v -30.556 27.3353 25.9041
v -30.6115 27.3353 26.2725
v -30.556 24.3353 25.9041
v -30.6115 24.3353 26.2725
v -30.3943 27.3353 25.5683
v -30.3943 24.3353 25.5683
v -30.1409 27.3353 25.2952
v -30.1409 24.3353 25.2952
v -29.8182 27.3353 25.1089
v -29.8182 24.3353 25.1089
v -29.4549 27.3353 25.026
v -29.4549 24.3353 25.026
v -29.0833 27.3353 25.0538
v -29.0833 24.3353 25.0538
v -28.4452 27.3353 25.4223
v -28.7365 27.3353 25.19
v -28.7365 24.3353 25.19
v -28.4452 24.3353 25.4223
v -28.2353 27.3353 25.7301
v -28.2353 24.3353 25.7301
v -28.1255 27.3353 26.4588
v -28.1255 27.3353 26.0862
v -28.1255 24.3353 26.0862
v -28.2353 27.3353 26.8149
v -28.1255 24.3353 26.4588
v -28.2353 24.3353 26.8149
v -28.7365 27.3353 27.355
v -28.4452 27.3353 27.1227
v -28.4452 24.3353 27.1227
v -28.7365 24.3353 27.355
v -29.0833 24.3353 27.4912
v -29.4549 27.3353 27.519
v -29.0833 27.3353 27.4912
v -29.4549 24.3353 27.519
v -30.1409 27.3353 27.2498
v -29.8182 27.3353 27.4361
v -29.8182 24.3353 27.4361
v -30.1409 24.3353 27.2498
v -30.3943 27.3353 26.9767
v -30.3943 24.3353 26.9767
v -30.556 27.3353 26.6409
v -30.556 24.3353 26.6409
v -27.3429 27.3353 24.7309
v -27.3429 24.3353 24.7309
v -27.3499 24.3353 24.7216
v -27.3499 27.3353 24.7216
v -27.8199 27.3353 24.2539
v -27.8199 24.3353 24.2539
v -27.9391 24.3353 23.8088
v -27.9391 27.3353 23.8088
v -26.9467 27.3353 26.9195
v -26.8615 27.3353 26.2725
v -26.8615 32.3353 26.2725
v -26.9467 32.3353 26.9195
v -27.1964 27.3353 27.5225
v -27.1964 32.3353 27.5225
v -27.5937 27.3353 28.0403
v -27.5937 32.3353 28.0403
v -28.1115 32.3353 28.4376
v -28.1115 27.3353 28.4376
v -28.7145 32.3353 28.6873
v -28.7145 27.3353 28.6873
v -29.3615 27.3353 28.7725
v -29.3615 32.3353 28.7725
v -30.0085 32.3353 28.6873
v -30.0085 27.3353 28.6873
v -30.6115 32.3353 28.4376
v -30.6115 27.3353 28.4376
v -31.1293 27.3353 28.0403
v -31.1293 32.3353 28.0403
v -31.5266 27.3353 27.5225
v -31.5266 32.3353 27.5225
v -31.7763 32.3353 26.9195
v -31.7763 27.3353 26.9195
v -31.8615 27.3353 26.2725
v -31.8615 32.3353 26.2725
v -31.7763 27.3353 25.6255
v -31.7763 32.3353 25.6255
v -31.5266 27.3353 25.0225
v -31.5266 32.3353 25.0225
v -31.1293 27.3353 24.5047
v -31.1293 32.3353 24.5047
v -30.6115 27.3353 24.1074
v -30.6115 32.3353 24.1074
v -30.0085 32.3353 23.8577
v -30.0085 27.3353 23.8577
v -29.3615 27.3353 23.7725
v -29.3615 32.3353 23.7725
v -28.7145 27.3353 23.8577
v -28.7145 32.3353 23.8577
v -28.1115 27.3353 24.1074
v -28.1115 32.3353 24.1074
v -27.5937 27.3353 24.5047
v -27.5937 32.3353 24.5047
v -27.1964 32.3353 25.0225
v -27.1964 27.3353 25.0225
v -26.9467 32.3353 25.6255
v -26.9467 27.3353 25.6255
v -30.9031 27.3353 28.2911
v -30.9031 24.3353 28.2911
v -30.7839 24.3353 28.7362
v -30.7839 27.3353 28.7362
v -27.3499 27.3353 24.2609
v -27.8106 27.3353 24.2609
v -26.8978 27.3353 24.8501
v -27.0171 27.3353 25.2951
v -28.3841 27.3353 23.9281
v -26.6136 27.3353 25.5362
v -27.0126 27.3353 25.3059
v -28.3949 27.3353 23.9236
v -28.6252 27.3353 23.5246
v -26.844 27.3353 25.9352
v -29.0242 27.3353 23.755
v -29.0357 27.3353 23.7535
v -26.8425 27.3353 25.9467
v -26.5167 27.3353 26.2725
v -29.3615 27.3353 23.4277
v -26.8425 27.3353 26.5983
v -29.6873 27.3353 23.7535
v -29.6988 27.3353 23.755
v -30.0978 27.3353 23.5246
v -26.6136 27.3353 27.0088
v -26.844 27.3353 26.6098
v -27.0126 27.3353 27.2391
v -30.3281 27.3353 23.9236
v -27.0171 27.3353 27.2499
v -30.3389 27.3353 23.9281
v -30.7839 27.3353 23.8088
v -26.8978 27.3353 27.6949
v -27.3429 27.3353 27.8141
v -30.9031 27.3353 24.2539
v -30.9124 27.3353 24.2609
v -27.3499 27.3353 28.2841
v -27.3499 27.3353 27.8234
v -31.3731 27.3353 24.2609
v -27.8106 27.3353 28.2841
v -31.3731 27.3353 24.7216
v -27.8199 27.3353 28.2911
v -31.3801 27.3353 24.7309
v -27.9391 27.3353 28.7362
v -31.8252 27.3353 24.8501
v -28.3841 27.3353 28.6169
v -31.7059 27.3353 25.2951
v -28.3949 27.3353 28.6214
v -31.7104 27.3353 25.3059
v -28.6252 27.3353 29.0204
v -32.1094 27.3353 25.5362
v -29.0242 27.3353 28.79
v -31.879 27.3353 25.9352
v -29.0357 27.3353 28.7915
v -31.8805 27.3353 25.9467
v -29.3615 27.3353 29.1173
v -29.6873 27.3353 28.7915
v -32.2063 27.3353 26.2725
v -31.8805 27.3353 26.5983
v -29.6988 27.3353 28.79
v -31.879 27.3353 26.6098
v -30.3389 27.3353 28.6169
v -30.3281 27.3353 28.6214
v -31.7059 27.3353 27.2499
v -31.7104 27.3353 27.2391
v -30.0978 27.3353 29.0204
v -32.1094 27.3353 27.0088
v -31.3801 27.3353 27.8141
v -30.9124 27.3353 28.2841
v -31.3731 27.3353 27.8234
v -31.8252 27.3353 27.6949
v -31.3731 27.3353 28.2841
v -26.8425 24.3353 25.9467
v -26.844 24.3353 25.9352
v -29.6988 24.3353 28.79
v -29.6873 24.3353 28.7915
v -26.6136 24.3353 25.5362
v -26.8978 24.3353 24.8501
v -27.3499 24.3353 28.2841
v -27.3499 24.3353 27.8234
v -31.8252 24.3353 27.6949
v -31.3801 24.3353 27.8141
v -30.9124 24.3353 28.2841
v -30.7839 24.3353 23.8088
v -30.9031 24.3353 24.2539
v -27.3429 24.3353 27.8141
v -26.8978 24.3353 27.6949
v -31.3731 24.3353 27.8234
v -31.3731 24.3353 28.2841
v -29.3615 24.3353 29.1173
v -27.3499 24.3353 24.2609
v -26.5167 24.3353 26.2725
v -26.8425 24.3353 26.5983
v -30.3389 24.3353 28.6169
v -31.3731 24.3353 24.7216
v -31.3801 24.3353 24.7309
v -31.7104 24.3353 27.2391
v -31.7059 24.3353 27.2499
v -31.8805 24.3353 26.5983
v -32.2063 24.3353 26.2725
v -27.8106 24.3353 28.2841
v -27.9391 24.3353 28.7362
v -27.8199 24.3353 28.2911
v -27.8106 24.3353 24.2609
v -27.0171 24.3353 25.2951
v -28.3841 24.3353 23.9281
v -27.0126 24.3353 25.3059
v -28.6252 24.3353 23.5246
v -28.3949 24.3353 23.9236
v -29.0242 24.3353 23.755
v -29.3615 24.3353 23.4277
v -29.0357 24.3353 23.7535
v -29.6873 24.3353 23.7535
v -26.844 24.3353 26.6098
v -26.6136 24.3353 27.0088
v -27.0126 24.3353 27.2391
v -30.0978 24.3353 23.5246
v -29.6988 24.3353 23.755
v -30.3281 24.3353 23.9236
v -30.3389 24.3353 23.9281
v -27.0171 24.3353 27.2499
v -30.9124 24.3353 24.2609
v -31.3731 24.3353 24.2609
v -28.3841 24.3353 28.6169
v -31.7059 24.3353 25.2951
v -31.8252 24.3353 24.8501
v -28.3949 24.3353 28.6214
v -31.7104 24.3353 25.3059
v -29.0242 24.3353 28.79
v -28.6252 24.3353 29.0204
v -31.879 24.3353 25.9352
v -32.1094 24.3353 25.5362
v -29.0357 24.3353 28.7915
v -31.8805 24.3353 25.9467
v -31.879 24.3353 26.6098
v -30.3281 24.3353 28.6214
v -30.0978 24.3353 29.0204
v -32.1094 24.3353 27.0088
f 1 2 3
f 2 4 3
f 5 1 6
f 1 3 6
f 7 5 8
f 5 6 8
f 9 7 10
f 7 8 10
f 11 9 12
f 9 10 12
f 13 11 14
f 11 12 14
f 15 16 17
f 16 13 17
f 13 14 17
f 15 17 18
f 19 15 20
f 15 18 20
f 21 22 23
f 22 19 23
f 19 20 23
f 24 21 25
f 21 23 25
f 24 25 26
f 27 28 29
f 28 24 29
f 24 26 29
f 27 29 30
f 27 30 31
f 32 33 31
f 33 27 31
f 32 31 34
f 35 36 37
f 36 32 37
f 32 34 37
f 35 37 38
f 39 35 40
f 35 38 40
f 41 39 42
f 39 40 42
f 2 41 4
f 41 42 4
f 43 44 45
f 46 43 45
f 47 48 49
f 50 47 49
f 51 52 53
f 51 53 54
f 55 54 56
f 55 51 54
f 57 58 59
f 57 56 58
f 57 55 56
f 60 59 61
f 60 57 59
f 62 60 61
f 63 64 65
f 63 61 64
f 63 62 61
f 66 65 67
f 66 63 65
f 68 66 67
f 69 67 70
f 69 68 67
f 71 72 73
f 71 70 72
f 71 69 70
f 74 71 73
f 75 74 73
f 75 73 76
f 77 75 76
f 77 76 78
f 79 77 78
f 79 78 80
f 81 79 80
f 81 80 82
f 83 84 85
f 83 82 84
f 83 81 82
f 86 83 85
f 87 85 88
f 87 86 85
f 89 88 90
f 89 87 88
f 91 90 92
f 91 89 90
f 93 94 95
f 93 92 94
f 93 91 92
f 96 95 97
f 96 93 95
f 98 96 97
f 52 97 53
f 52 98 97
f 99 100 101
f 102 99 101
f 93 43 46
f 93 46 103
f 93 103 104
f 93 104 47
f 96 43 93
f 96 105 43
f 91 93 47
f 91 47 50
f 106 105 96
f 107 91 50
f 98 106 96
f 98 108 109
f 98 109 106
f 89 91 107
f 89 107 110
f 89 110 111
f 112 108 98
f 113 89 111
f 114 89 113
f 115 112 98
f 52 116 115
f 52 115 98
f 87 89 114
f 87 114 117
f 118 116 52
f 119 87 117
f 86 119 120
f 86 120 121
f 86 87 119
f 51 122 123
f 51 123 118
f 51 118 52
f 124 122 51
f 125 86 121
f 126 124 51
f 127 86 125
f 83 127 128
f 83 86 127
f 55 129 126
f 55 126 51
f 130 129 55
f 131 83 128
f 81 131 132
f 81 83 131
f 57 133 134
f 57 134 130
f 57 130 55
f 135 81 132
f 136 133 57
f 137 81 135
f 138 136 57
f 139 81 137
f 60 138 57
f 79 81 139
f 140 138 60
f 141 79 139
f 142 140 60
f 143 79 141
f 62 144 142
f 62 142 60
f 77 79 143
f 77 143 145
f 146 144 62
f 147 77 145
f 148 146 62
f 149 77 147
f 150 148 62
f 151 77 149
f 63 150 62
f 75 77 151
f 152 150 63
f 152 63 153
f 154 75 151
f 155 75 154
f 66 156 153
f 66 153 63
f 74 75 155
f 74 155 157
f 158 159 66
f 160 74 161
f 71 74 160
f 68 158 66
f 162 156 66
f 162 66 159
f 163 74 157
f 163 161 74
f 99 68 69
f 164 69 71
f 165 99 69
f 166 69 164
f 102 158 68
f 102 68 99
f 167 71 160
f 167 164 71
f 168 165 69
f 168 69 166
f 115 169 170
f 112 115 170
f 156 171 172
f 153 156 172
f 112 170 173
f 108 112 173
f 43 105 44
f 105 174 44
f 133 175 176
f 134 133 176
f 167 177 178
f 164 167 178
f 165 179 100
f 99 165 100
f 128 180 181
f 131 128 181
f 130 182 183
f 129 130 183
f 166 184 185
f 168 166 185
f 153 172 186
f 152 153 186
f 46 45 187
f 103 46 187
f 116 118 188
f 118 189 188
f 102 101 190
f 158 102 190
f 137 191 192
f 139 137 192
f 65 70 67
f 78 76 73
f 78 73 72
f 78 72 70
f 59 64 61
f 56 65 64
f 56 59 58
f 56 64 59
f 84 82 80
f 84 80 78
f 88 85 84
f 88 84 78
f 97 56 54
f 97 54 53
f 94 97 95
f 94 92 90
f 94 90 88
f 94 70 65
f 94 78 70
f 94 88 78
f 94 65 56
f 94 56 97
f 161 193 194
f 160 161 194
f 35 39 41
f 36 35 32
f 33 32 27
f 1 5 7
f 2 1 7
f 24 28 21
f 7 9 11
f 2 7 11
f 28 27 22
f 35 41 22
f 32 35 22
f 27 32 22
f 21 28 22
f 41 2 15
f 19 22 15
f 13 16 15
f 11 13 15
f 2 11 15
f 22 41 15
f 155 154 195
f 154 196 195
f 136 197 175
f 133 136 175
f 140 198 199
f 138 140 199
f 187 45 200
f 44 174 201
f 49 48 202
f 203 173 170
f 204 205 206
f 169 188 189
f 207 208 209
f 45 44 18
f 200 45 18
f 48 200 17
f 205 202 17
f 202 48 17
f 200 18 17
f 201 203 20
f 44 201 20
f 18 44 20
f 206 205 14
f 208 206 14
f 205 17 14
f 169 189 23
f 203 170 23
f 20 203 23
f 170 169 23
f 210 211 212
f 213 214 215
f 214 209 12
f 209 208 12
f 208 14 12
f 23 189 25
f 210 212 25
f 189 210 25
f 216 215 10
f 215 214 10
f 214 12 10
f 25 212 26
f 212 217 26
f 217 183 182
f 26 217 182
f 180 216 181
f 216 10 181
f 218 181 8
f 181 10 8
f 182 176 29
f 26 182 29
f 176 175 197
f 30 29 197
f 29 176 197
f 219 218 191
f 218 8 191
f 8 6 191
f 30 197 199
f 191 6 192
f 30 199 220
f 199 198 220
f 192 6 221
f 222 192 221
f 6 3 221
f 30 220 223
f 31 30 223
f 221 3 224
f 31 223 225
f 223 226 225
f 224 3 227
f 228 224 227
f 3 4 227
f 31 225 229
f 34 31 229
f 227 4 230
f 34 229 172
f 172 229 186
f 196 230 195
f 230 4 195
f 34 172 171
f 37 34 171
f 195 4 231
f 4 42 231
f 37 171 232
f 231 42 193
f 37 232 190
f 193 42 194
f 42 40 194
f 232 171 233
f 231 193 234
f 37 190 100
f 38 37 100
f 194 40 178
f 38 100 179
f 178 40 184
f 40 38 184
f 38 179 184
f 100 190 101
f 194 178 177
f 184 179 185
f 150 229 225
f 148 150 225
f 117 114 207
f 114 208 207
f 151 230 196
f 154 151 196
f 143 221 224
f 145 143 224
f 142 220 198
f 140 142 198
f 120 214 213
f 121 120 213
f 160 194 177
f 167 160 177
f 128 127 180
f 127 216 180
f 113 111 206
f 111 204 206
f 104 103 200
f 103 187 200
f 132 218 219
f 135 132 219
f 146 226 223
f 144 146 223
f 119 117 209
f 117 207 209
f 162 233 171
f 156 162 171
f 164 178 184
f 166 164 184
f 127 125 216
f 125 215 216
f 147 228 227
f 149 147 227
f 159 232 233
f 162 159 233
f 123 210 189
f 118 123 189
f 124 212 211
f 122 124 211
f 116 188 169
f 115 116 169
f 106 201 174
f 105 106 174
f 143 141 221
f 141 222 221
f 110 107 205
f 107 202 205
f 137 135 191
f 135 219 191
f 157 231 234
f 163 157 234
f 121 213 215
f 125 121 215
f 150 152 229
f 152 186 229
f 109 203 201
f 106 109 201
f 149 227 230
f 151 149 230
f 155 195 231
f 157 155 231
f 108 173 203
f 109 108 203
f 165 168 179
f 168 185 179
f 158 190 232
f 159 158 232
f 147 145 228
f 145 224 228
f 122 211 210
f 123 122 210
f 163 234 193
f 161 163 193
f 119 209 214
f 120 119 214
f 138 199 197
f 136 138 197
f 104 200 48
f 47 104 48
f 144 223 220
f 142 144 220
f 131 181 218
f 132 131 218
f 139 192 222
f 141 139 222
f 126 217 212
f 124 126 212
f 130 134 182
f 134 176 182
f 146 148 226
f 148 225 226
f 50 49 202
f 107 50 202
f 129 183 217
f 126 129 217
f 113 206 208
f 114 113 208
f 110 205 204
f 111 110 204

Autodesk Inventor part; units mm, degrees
ref_plane "YZ Plane" through (0, 0, 0) normal (1, 0, 0) x (0, 1, 0)
ref_plane "XZ Plane" through (0, 0, 0) normal (0, 1, 0) x (-1, 0, 0)
ref_plane "XY Plane" through (0, 0, 0) normal (0, 0, 1) x (1, 0, 0)
ref_plane "Work Plane6" through (-21.8665, 24.3353, 26.2725) normal (0, 1, 0) x (-1, 0, 0)
sketch "Sketch1" plane through (-21.8665, 24.3353, 26.2725) normal (0, 1, 0) x (-1, 0, 0)
  line L0 (7.495, -2.8448) -> (7.8208, -2.519) projected
  line L1 (7.8208, -2.519) -> (7.8323, -2.5175) projected
  line L2 (7.8323, -2.5175) -> (8.2313, -2.7479) projected
  line L3 (8.2313, -2.7479) -> (8.4616, -2.3489) projected
  line L4 (8.4616, -2.3489) -> (8.4724, -2.3444) projected
  line L5 (8.4724, -2.3444) -> (8.9174, -2.4637) projected
  line L6 (8.9174, -2.4637) -> (9.0366, -2.0186) projected
  line L7 (9.0366, -2.0186) -> (9.0459, -2.0116) projected
  line L8 (9.0459, -2.0116) -> (9.5066, -2.0116) projected
  line L9 (9.5066, -2.0116) -> (9.5066, -1.5509) projected
  line L10 (9.5066, -1.5509) -> (9.5136, -1.5416) projected
  line L11 (9.5136, -1.5416) -> (9.9587, -1.4224) projected
  line L12 (9.9587, -1.4224) -> (9.8394, -0.9774) projected
  line L13 (9.8394, -0.9774) -> (9.8439, -0.9666) projected
  line L14 (9.8439, -0.9666) -> (10.2429, -0.7363) projected
  line L15 (10.2429, -0.7363) -> (10.0125, -0.3373) projected
  line L16 (10.0125, -0.3373) -> (10.014, -0.3258) projected
  line L17 (10.014, -0.3258) -> (10.3398, 0) projected
  line L18 (10.3398, 0) -> (10.014, 0.3258) projected
  line L19 (10.014, 0.3258) -> (10.0125, 0.3373) projected
  line L20 (10.0125, 0.3373) -> (10.2429, 0.7363) projected
  line L21 (10.2429, 0.7363) -> (9.8439, 0.9666) projected
  line L22 (9.8439, 0.9666) -> (9.8394, 0.9774) projected
  line L23 (9.8394, 0.9774) -> (9.9587, 1.4224) projected
  line L24 (9.9587, 1.4224) -> (9.5136, 1.5416) projected
  line L25 (9.5136, 1.5416) -> (9.5066, 1.5509) projected
  line L26 (9.5066, 1.5509) -> (9.5066, 2.0116) projected
  line L27 (9.5066, 2.0116) -> (9.0459, 2.0116) projected
  line L28 (9.0459, 2.0116) -> (9.0366, 2.0186) projected
  line L29 (9.0366, 2.0186) -> (8.9174, 2.4637) projected
  line L30 (8.9174, 2.4637) -> (8.4724, 2.3444) projected
  line L31 (8.4724, 2.3444) -> (8.4616, 2.3489) projected
  line L32 (8.4616, 2.3489) -> (8.2313, 2.7479) projected
  line L33 (8.2313, 2.7479) -> (7.8323, 2.5175) projected
  line L34 (7.8323, 2.5175) -> (7.8208, 2.519) projected
  line L35 (7.8208, 2.519) -> (7.495, 2.8448) projected
  line L36 (7.495, 2.8448) -> (7.1692, 2.519) projected
  line L37 (7.1692, 2.519) -> (7.1577, 2.5175) projected
  line L38 (7.1577, 2.5175) -> (6.7587, 2.7479) projected
  line L39 (6.7587, 2.7479) -> (6.5284, 2.3489) projected
  line L40 (6.5284, 2.3489) -> (6.5176, 2.3444) projected
  line L41 (6.5176, 2.3444) -> (6.0726, 2.4637) projected
  line L42 (6.0726, 2.4637) -> (5.9534, 2.0186) projected
  line L43 (5.9534, 2.0186) -> (5.9441, 2.0116) projected
  line L44 (5.9441, 2.0116) -> (5.4834, 2.0116) projected
  line L45 (5.4834, 2.0116) -> (5.4834, 1.5509) projected
  line L46 (5.4834, 1.5509) -> (5.4764, 1.5416) projected
  line L47 (5.4764, 1.5416) -> (5.0313, 1.4224) projected
  line L48 (5.0313, 1.4224) -> (5.1506, 0.9774) projected
  line L49 (5.1506, 0.9774) -> (5.1461, 0.9666) projected
  line L50 (5.1461, 0.9666) -> (4.7471, 0.7363) projected
  line L51 (4.7471, 0.7363) -> (4.9775, 0.3373) projected
  line L52 (4.9775, 0.3373) -> (4.976, 0.3258) projected
  line L53 (4.976, 0.3258) -> (4.6502, 0) projected
  line L54 (4.6502, 0) -> (4.976, -0.3258) projected
  line L55 (4.976, -0.3258) -> (4.9775, -0.3373) projected
  line L56 (4.9775, -0.3373) -> (4.7471, -0.7363) projected
  line L57 (4.7471, -0.7363) -> (5.1461, -0.9666) projected
  line L58 (5.1461, -0.9666) -> (5.1506, -0.9774) projected
  line L59 (5.1506, -0.9774) -> (5.0313, -1.4224) projected
  line L60 (5.0313, -1.4224) -> (5.4764, -1.5416) projected
  line L61 (5.4764, -1.5416) -> (5.4834, -1.5509) projected
  line L62 (5.4834, -1.5509) -> (5.4834, -2.0116) projected
  line L63 (5.4834, -2.0116) -> (5.9441, -2.0116) projected
  line L64 (5.9441, -2.0116) -> (5.9534, -2.0186) projected
  line L65 (5.9534, -2.0186) -> (6.0726, -2.4637) projected
  line L66 (6.0726, -2.4637) -> (6.5176, -2.3444) projected
  line L67 (6.5176, -2.3444) -> (6.5284, -2.3489) projected
  line L68 (6.5284, -2.3489) -> (6.7587, -2.7479) projected
  line L69 (6.7587, -2.7479) -> (7.1577, -2.5175) projected
  line L70 (7.1577, -2.5175) -> (7.1692, -2.519) projected
  line L71 (7.1692, -2.519) -> (7.495, -2.8448) projected
  circle A0 centre (7.495, 0) radius 1.25 projected
  point P0 (-21.8665, -26.2725)
extrude "Extrusion1" add sketch "Sketch1" along normal blind 3
ref_plane "Work Plane5" through (-21.8665, 27.3353, 26.2725) normal (0, 1, 0) x (1, 0, 0)
sketch "Sketch4" plane through (-21.8665, 27.3353, 26.2725) normal (0, 1, 0) x (1, 0, 0)
  circle A0 centre (-7.495, 0) radius 1.25 construction
  circle A1 centre (-7.495, 0) radius 2.5
  point P0 (21.8665, 26.2725)
extrude "Extrusion2" add sketch "Sketch4" along normal blind 5
properties part number "servo_spine" material "Brass, Soft Yellow"
